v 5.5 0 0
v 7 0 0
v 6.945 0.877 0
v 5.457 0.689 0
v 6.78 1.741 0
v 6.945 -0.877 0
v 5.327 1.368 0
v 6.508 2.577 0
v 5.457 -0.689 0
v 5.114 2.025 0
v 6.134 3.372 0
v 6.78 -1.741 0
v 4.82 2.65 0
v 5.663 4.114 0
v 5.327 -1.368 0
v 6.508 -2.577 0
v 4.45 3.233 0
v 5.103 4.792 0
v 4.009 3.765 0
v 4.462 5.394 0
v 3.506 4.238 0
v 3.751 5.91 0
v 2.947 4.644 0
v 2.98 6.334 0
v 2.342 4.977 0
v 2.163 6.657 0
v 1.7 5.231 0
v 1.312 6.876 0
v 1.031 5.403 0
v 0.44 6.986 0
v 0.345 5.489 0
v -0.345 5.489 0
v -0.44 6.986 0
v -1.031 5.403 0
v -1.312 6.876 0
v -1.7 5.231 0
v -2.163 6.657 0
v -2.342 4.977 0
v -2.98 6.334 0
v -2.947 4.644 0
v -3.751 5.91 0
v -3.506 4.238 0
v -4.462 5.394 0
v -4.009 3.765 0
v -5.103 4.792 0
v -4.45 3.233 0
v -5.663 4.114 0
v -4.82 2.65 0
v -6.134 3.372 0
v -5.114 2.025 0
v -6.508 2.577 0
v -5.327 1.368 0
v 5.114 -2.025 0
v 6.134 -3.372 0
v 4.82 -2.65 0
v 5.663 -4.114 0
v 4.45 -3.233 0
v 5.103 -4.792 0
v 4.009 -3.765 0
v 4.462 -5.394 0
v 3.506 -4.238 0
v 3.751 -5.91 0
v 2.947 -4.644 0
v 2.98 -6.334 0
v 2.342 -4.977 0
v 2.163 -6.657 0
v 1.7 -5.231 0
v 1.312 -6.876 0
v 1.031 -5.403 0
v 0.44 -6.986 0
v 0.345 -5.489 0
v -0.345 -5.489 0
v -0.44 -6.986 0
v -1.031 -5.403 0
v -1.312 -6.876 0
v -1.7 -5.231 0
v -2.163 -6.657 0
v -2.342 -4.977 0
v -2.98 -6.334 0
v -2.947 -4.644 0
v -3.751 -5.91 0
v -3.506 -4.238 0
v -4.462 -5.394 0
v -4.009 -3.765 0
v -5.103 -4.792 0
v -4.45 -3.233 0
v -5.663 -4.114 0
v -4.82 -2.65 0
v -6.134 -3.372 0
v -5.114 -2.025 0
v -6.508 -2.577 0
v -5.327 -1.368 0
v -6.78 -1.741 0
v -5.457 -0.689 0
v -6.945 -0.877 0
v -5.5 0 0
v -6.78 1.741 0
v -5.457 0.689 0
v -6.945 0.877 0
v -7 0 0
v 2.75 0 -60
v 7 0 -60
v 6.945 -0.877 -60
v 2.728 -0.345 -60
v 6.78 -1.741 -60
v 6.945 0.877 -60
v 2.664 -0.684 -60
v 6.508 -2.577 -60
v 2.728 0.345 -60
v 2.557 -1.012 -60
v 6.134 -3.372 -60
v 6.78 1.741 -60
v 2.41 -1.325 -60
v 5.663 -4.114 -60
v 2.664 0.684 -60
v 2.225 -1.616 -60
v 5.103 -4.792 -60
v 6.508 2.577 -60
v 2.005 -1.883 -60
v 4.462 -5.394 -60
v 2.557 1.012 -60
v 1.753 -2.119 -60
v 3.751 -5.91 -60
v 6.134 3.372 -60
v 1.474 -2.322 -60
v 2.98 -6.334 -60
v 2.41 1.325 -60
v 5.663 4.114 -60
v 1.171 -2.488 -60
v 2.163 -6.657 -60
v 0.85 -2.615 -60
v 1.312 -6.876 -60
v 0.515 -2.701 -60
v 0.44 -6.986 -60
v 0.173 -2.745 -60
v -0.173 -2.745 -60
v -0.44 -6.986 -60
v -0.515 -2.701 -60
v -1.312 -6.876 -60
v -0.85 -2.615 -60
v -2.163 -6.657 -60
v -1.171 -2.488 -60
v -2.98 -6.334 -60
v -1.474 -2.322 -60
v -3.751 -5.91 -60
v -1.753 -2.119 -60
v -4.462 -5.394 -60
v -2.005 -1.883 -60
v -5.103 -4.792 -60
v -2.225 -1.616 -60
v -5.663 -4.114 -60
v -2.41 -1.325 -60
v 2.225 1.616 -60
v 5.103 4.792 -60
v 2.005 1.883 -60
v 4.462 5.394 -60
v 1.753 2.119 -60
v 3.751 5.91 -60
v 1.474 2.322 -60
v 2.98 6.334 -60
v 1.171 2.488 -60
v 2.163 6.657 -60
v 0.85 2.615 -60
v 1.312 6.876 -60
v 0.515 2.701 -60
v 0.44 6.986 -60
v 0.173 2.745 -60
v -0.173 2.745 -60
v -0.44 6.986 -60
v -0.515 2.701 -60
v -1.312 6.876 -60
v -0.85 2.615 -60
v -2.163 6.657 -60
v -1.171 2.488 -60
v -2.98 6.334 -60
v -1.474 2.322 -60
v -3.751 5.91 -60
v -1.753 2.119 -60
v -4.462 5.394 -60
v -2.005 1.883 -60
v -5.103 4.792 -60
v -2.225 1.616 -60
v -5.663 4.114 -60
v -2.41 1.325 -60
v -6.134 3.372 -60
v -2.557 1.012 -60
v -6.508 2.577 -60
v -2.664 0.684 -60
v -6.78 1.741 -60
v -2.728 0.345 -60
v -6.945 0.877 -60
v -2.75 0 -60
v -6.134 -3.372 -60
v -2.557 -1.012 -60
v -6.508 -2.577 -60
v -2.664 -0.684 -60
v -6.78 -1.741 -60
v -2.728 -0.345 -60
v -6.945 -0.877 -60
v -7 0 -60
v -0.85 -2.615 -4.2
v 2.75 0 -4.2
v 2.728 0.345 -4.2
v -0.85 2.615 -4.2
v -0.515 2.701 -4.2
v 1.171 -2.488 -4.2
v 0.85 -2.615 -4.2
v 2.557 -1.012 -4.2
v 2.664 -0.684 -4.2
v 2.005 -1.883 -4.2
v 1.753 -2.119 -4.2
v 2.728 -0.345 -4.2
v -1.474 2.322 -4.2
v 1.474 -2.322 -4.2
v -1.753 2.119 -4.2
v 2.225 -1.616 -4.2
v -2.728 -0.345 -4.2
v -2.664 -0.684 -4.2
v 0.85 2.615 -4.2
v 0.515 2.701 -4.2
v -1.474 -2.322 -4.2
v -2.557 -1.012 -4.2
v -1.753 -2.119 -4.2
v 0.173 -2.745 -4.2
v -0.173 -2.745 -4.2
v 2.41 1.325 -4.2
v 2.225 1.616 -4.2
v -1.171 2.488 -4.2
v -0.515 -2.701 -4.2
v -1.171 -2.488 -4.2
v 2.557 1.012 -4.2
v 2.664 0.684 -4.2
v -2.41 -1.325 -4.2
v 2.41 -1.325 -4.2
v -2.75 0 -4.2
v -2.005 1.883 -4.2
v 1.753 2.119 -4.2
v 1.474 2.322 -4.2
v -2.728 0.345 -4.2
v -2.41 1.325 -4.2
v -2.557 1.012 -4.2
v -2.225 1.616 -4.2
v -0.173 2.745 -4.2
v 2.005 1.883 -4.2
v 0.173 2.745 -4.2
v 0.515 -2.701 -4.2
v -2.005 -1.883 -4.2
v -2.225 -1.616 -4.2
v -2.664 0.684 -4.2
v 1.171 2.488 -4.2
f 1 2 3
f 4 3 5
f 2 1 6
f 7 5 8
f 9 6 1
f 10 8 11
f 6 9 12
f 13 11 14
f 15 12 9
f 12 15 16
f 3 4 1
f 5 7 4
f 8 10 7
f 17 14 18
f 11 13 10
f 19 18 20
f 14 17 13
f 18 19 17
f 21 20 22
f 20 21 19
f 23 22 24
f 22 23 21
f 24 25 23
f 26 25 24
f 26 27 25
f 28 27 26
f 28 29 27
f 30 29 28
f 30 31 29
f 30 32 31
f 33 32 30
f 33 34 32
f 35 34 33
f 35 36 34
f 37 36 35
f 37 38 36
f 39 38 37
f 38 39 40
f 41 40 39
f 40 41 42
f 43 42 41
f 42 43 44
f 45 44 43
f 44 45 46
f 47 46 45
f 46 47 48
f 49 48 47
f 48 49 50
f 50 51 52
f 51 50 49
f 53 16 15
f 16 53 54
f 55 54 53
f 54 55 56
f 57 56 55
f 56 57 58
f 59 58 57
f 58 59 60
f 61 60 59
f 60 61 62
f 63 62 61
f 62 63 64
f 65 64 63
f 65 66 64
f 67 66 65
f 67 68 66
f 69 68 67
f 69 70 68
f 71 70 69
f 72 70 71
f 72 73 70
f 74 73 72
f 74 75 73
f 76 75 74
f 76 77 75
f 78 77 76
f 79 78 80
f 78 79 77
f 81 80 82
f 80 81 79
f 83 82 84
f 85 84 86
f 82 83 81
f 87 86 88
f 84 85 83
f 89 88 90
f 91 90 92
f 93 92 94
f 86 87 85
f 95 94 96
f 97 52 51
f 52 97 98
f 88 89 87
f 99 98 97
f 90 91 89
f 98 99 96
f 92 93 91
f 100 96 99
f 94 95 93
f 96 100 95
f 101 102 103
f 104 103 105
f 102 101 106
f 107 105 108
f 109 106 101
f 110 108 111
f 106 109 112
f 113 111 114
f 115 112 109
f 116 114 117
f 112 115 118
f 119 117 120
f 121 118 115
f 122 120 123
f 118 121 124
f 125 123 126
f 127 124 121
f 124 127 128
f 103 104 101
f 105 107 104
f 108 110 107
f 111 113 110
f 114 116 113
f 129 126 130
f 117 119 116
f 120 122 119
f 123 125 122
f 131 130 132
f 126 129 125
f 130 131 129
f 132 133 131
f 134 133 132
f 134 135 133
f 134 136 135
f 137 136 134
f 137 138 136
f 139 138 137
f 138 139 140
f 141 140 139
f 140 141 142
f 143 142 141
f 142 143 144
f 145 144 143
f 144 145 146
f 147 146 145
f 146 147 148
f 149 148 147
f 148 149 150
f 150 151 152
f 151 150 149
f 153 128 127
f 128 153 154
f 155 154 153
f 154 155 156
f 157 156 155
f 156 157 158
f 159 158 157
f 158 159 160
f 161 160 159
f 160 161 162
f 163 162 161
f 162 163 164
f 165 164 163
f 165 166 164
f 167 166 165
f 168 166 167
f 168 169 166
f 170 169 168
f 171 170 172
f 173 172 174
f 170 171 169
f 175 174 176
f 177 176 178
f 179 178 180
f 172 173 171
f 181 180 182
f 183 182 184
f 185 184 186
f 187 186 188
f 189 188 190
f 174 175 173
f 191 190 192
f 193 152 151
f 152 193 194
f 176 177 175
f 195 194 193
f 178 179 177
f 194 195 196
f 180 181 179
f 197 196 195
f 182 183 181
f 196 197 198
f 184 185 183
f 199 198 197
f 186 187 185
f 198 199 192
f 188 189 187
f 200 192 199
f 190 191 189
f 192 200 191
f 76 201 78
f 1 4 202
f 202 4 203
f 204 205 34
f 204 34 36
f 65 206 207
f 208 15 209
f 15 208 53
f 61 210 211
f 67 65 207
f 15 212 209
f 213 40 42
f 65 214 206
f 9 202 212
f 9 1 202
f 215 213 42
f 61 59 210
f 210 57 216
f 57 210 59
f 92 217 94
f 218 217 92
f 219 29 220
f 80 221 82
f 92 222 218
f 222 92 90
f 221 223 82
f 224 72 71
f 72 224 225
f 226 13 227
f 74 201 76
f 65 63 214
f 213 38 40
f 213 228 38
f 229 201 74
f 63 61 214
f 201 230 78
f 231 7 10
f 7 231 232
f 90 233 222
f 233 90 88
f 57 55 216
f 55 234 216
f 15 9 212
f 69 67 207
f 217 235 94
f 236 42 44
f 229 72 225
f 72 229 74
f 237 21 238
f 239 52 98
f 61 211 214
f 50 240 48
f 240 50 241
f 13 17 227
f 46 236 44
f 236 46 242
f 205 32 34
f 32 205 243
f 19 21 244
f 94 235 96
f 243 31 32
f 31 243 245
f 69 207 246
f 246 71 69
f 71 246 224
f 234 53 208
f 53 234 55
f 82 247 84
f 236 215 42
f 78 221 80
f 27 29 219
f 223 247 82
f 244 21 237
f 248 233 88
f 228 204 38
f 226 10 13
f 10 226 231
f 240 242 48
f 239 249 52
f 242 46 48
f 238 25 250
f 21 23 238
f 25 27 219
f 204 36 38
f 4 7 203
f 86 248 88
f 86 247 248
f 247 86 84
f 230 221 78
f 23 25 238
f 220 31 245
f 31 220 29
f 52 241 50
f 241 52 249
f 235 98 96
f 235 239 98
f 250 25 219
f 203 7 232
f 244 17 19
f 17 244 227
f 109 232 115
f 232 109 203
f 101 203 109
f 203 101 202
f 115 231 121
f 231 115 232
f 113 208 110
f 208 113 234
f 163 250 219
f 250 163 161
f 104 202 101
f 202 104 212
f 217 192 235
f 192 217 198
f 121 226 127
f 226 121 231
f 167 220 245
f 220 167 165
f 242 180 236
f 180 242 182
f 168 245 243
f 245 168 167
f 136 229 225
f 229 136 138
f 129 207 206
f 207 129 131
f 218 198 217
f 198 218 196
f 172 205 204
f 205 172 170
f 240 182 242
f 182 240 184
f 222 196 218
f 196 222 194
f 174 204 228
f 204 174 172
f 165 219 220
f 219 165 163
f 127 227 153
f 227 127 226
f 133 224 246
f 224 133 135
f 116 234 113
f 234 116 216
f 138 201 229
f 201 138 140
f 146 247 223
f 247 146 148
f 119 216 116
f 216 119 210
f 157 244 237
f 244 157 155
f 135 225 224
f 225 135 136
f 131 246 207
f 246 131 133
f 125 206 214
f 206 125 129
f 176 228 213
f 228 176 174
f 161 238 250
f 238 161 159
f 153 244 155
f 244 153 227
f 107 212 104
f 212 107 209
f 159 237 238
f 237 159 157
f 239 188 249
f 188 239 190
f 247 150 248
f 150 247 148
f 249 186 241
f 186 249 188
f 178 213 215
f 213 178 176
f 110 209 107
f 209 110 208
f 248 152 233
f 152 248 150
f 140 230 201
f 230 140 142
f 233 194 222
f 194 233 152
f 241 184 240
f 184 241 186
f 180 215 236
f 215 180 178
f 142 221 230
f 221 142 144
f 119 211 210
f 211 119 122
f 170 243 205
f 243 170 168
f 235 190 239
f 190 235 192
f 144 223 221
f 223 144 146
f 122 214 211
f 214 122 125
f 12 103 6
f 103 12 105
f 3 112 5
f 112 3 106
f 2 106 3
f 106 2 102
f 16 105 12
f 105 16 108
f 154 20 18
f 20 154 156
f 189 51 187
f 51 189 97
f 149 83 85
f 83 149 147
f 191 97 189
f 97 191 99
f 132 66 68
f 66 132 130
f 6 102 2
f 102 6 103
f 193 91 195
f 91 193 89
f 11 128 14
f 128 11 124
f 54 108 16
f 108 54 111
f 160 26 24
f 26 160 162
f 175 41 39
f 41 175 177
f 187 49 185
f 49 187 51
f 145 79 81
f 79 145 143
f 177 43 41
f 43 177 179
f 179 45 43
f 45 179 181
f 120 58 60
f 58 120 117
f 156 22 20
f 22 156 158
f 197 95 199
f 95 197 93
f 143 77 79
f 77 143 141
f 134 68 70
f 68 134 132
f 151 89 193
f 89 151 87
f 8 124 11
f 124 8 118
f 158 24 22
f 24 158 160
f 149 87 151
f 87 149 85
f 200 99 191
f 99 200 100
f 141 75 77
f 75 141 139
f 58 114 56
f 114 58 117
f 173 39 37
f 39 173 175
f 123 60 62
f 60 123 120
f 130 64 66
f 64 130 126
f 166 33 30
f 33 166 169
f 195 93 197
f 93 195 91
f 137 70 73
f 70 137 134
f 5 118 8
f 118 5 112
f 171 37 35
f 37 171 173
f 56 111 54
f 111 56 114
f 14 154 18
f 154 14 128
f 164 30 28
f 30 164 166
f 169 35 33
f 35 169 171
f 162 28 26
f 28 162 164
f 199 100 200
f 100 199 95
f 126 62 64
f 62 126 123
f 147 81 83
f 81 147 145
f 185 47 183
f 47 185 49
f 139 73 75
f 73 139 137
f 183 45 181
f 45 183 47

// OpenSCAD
$fn = 50;


difference() {
	union() {
		translate(v = [0, 0, -60.0000000000]) {
			cylinder(h = 60, r = 7.0000000000);
		}
		cylinder(h = 0, r = 16.0000000000);
	}
	union() {
		translate(v = [0, 0, 0]) {
			rotate(a = [0, 0, 0]) {
				difference() {
					union() {
						#translate(v = [0, 0, -60.0000000000]) {
							cylinder(h = 60, r = 2.2500000000);
						}
						#translate(v = [0, 0, -4.2000000000]) {
							cylinder(h = 4.2000000000, r1 = 2.7500000000, r2 = 5.5000000000);
						}
						#translate(v = [0, 0, -60.0000000000]) {
							cylinder(h = 60, r = 2.7500000000);
						}
						#translate(v = [0, 0, -60.0000000000]) {
							cylinder(h = 60, r = 2.2500000000);
						}
					}
					union();
				}
			}
		}
	}
}
